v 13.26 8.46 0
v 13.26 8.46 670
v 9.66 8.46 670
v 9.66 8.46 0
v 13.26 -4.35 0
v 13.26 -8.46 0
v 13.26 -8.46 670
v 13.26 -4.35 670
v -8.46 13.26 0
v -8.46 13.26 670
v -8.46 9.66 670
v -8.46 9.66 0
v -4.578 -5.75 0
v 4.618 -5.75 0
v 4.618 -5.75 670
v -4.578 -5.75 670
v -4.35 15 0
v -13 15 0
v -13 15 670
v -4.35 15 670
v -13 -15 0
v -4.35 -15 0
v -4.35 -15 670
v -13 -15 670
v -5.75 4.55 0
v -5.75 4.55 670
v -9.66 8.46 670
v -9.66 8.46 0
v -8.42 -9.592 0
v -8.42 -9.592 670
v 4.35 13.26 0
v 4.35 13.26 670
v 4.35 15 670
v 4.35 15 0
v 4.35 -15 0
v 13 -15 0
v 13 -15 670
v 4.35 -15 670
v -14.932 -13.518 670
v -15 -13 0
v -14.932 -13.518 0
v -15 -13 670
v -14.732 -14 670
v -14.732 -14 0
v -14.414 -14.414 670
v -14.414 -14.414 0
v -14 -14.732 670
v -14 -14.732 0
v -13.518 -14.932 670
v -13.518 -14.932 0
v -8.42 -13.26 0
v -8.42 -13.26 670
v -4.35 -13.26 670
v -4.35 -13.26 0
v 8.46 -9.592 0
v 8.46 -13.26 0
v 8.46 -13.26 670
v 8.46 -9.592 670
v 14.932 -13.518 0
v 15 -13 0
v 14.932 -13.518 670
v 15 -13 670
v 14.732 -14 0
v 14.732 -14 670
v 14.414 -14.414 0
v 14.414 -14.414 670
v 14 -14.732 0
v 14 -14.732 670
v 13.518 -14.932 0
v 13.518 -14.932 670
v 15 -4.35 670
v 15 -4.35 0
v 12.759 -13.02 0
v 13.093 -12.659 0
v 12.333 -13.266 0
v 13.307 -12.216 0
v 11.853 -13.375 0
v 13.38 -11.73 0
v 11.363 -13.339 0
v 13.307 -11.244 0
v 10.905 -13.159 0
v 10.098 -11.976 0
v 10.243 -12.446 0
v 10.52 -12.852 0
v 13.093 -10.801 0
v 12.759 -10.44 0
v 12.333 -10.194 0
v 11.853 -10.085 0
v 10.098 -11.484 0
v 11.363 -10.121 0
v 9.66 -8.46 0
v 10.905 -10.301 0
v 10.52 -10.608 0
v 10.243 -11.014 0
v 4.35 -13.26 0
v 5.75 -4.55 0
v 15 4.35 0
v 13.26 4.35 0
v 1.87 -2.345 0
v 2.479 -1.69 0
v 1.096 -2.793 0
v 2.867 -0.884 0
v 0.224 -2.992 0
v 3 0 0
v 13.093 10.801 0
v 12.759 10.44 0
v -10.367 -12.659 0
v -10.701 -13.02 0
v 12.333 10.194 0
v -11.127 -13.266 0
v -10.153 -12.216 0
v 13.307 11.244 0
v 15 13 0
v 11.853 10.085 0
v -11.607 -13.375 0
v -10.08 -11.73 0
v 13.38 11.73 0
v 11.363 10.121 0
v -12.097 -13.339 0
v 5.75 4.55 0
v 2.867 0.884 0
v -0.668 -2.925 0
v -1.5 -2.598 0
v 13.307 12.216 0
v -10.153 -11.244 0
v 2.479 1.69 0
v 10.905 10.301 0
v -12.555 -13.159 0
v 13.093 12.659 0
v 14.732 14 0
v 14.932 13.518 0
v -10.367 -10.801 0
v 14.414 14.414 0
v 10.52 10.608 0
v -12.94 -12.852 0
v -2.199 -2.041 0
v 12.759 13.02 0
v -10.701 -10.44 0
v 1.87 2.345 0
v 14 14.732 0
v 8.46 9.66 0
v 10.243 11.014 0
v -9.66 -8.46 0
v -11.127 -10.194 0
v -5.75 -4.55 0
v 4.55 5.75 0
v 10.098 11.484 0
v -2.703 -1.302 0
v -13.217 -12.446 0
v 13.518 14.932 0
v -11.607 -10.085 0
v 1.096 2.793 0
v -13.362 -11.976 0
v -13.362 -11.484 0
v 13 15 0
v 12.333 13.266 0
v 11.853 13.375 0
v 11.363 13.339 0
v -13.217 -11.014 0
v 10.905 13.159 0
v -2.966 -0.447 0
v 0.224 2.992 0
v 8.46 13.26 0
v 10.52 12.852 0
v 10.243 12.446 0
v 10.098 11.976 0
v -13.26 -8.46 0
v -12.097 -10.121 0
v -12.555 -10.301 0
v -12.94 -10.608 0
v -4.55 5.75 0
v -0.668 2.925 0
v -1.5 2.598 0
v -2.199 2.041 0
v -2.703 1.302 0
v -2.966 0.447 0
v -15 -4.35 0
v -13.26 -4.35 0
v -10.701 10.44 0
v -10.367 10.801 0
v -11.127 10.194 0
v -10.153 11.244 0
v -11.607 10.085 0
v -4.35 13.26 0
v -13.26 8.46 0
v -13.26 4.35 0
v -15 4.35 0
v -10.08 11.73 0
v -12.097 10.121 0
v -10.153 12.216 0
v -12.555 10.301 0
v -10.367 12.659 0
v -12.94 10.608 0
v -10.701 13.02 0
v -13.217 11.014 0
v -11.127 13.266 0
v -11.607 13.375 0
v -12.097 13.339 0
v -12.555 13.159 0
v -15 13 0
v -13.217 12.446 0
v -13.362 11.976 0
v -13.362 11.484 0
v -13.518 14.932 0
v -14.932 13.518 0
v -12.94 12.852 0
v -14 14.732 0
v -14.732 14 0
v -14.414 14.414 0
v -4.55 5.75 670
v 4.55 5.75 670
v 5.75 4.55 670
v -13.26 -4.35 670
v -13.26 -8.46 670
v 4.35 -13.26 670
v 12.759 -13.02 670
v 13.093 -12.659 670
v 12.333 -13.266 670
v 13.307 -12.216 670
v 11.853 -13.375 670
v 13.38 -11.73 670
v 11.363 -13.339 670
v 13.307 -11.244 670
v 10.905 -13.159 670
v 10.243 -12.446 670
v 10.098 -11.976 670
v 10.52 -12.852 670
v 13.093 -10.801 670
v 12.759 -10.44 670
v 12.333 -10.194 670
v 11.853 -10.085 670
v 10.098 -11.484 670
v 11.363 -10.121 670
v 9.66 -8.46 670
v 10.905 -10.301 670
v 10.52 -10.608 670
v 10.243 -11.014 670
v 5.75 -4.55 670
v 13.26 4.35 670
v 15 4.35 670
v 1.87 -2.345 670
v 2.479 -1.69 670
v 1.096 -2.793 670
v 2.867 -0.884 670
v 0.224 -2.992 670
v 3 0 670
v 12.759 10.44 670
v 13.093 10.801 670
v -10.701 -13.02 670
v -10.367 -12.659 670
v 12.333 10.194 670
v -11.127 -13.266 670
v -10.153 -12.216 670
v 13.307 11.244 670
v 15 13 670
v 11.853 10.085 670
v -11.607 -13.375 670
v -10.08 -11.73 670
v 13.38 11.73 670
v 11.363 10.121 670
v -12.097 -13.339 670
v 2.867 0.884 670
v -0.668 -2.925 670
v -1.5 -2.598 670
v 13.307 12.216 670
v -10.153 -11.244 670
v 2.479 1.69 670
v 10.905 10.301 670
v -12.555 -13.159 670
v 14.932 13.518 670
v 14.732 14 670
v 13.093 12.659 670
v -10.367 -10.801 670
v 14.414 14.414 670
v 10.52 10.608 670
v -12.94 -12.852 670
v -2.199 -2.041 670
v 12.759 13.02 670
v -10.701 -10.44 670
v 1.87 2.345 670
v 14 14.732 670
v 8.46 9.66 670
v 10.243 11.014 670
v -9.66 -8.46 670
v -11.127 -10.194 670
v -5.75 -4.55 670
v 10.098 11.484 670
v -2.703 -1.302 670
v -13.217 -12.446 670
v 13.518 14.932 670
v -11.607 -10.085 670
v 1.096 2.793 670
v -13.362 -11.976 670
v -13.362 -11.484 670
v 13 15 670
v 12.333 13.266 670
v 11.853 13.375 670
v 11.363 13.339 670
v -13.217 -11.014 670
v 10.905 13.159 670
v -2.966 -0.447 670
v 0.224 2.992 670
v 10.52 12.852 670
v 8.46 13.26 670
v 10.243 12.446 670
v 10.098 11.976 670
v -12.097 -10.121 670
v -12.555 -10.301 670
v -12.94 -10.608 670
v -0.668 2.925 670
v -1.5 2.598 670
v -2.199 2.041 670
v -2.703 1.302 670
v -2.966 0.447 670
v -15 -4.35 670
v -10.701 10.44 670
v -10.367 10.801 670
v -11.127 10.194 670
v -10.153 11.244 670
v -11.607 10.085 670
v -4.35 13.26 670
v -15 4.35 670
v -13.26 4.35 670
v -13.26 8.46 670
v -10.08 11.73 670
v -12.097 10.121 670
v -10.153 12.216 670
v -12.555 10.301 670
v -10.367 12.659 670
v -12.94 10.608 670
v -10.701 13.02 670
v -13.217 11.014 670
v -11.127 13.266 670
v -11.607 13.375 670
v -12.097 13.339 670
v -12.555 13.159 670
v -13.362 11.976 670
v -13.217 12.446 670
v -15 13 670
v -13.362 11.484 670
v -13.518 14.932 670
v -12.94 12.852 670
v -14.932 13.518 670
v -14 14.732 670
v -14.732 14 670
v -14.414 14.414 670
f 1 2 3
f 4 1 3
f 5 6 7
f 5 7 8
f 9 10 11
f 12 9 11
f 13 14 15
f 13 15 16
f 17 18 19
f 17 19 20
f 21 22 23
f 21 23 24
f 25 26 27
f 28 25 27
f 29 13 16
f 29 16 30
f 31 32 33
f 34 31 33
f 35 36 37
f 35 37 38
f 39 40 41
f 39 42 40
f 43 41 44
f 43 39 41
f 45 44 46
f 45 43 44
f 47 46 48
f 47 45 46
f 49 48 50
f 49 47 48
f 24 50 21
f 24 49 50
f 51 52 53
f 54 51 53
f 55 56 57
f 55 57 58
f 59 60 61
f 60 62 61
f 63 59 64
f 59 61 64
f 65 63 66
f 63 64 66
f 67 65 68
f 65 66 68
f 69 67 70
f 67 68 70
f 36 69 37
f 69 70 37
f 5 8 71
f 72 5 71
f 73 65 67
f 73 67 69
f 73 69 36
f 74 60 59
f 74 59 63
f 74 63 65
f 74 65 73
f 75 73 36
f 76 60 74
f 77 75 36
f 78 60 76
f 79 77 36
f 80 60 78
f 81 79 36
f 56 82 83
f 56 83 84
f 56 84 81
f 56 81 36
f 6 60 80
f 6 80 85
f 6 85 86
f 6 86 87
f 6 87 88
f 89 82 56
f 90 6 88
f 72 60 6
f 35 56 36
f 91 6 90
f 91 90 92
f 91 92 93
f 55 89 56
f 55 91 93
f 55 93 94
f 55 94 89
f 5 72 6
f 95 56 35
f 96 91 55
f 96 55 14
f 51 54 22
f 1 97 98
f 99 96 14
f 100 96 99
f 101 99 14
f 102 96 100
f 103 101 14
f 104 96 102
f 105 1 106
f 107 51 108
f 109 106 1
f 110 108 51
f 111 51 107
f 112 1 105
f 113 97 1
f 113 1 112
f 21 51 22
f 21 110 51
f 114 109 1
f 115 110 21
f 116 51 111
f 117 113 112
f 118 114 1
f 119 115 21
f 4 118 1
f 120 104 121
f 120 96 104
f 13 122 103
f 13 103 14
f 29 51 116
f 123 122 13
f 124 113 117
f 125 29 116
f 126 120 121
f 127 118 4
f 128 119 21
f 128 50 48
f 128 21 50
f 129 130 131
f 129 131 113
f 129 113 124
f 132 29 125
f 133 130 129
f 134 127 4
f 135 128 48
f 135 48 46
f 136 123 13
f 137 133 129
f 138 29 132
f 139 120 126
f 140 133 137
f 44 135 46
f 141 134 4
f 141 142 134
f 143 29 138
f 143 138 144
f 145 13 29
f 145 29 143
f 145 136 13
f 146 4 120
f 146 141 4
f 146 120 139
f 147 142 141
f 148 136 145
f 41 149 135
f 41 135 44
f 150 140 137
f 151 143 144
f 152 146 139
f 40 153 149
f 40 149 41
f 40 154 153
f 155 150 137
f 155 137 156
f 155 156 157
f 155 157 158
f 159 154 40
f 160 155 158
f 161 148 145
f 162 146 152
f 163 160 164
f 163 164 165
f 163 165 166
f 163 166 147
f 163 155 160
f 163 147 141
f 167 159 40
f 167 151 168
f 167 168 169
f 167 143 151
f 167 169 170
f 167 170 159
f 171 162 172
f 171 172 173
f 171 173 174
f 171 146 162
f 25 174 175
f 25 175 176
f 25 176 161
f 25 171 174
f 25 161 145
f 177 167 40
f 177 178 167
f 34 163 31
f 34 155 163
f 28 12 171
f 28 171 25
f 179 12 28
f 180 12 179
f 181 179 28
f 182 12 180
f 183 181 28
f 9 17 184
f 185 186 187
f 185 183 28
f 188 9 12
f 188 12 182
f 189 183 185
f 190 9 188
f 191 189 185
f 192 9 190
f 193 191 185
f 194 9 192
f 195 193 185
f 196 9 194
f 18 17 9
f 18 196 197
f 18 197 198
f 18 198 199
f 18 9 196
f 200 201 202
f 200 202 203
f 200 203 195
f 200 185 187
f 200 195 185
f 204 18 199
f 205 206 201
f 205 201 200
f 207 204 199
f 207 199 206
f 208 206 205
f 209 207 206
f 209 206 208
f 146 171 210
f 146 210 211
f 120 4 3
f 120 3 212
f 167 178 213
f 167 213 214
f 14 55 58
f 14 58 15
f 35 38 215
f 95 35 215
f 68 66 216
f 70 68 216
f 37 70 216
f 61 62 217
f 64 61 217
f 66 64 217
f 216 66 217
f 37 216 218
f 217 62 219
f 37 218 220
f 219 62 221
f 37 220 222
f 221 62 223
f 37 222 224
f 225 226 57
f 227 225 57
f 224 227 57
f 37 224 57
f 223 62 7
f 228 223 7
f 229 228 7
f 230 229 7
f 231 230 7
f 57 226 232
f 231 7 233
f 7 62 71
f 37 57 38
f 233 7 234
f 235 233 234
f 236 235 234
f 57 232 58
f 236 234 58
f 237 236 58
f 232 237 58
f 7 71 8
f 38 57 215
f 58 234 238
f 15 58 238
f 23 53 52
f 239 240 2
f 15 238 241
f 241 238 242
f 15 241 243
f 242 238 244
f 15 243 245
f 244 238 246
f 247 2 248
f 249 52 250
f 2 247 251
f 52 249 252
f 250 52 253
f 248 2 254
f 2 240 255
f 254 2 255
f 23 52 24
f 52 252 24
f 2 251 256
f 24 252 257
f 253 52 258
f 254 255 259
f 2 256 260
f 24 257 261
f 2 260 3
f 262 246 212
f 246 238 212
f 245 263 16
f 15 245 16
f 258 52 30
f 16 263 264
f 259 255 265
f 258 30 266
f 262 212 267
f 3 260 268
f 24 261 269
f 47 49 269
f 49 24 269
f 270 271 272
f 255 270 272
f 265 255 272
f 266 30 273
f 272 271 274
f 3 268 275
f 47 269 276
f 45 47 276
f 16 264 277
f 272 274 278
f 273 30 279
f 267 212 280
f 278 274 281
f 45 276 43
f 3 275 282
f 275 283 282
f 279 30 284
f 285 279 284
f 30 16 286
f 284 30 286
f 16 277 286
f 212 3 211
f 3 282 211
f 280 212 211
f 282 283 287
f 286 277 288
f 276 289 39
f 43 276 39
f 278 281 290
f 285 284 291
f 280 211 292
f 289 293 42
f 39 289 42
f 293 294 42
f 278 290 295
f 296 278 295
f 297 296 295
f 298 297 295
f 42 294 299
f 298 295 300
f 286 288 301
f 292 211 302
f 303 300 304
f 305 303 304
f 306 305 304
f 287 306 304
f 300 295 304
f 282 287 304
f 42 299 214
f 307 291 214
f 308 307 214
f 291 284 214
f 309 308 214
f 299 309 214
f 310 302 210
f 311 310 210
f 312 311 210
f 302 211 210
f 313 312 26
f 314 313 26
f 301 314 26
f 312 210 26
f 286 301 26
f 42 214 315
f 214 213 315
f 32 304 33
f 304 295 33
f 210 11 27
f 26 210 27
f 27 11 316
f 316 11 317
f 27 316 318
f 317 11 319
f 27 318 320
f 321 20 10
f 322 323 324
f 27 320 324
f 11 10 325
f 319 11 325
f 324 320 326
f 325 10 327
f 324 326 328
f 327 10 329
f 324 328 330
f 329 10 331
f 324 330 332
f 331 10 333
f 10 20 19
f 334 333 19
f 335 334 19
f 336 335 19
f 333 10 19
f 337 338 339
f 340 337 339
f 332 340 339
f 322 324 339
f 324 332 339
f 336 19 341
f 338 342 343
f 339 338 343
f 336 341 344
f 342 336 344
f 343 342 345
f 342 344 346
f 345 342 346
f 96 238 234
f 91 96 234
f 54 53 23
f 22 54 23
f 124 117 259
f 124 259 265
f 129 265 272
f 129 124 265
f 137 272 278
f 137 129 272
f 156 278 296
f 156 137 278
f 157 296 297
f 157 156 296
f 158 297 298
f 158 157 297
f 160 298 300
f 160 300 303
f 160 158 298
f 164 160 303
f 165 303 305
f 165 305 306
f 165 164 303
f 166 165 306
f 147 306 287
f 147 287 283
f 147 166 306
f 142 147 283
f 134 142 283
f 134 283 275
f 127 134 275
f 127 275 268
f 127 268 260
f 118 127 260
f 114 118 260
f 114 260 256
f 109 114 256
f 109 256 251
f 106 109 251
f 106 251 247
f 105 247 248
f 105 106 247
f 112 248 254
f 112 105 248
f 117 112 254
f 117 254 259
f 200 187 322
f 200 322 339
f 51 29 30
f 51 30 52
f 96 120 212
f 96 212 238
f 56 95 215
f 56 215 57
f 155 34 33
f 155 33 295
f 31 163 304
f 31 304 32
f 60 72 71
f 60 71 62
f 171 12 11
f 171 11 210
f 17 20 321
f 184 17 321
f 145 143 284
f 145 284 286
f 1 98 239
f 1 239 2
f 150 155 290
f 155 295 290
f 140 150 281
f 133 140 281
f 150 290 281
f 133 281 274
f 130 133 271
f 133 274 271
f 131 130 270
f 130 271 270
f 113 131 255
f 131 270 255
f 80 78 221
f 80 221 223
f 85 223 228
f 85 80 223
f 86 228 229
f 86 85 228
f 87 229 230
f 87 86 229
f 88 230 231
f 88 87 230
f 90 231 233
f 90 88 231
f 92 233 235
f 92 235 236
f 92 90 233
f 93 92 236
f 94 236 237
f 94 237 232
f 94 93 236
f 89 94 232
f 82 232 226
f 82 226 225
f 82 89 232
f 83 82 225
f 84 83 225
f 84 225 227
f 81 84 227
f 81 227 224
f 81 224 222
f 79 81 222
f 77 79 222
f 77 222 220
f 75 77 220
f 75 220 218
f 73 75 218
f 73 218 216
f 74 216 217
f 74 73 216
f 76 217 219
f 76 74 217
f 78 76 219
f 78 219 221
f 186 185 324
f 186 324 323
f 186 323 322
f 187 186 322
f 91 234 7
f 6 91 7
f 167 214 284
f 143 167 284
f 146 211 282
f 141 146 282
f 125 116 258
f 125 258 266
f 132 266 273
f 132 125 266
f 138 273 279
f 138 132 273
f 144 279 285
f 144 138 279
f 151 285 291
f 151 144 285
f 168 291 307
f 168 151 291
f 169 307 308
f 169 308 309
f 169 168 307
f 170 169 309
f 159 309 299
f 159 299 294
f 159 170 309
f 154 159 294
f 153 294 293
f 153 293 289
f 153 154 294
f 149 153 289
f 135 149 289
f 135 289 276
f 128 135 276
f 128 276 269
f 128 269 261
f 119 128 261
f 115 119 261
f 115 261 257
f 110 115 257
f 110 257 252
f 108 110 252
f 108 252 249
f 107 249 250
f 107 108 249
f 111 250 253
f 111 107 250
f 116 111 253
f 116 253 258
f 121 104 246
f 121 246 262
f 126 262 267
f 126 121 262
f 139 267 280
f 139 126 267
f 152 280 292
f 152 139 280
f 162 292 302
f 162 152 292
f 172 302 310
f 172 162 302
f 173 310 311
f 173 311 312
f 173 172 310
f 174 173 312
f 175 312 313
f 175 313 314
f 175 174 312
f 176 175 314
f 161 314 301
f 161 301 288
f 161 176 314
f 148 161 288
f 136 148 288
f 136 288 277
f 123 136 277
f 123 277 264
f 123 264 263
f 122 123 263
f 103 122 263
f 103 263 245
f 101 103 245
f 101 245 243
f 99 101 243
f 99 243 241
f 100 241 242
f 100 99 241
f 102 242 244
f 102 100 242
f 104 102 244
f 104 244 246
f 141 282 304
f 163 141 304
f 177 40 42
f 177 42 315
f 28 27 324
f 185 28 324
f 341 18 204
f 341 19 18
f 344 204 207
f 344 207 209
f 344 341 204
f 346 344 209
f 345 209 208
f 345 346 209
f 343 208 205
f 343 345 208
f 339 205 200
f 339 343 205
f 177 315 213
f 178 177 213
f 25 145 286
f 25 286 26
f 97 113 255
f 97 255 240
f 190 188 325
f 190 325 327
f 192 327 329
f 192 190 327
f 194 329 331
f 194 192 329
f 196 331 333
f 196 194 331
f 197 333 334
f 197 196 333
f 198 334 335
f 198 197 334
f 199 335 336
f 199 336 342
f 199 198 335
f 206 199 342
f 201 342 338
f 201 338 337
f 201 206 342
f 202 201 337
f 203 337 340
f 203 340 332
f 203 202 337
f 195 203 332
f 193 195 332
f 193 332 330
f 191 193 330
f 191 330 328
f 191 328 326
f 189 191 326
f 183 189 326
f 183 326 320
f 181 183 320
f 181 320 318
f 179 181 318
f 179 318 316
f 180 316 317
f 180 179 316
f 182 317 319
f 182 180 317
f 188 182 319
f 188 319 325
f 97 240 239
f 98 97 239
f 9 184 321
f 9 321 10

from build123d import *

# Parameters (mm, degrees)
SKETCH1_R           = 3
SKETCH1_R_2         = 1.65
BOSS_EXTRUDE1_DEPTH = 670
FILLET1_R           = 2


with BuildPart() as part:
    # Sketch1 → Boss-Extrude1 (new body)
    with BuildSketch(Plane.XY):
        Polygon((-8.46, 9.66), (-4.55, 5.75), (4.55, 5.75), (8.46, 9.66), (8.46, 13.26), (4.35, 13.26), (4.35, 15), (15, 15), (15, 4.35), (13.26, 4.35), (13.26, 8.46), (9.66, 8.46), (5.75, 4.55), (5.75, -4.55), (9.66, -8.46), (13.26, -8.46), (13.26, -4.35), (15, -4.35), (15, -15), (4.35, -15), (4.35, -13.26), (8.46, -13.26), (8.46, -9.59186747), (4.61813253, -5.75), (-4.578313253, -5.75), (-8.420180723, -9.59186747), (-8.420180723, -13.26), (-4.35, -13.26), (-4.35, -15), (-15, -15), (-15, -4.35), (-13.26, -4.35), (-13.26, -8.46), (-9.66, -8.46), (-5.75, -4.55), (-5.75, 4.55), (-9.66, 8.46), (-13.26, 8.46), (-13.26, 4.35), (-15, 4.35), (-15, 15), (-4.35, 15), (-4.35, 13.26), (-8.46, 13.26), align=None)
        Circle(SKETCH1_R, mode=Mode.SUBTRACT)
        with Locations((11.73, 11.73)):
            Circle(SKETCH1_R_2, mode=Mode.SUBTRACT)
        with Locations((11.73, -11.73)):
            Circle(SKETCH1_R_2, mode=Mode.SUBTRACT)
        with Locations((-11.73, -11.73)):
            Circle(SKETCH1_R_2, mode=Mode.SUBTRACT)
        with Locations((-11.73, 11.73)):
            Circle(SKETCH1_R_2, mode=Mode.SUBTRACT)
    extrude(amount=BOSS_EXTRUDE1_DEPTH)

    # Fillet1
    fillet1_edges = [part.edges().sort_by_distance(p)[0] for p in [
        (15, 15, 335),
        (15, -15, 335),
        (-15, -15, 335),
        (-15, 15, 335),
    ]]
    fillet(fillet1_edges, radius=FILLET1_R)


solid = part.part
